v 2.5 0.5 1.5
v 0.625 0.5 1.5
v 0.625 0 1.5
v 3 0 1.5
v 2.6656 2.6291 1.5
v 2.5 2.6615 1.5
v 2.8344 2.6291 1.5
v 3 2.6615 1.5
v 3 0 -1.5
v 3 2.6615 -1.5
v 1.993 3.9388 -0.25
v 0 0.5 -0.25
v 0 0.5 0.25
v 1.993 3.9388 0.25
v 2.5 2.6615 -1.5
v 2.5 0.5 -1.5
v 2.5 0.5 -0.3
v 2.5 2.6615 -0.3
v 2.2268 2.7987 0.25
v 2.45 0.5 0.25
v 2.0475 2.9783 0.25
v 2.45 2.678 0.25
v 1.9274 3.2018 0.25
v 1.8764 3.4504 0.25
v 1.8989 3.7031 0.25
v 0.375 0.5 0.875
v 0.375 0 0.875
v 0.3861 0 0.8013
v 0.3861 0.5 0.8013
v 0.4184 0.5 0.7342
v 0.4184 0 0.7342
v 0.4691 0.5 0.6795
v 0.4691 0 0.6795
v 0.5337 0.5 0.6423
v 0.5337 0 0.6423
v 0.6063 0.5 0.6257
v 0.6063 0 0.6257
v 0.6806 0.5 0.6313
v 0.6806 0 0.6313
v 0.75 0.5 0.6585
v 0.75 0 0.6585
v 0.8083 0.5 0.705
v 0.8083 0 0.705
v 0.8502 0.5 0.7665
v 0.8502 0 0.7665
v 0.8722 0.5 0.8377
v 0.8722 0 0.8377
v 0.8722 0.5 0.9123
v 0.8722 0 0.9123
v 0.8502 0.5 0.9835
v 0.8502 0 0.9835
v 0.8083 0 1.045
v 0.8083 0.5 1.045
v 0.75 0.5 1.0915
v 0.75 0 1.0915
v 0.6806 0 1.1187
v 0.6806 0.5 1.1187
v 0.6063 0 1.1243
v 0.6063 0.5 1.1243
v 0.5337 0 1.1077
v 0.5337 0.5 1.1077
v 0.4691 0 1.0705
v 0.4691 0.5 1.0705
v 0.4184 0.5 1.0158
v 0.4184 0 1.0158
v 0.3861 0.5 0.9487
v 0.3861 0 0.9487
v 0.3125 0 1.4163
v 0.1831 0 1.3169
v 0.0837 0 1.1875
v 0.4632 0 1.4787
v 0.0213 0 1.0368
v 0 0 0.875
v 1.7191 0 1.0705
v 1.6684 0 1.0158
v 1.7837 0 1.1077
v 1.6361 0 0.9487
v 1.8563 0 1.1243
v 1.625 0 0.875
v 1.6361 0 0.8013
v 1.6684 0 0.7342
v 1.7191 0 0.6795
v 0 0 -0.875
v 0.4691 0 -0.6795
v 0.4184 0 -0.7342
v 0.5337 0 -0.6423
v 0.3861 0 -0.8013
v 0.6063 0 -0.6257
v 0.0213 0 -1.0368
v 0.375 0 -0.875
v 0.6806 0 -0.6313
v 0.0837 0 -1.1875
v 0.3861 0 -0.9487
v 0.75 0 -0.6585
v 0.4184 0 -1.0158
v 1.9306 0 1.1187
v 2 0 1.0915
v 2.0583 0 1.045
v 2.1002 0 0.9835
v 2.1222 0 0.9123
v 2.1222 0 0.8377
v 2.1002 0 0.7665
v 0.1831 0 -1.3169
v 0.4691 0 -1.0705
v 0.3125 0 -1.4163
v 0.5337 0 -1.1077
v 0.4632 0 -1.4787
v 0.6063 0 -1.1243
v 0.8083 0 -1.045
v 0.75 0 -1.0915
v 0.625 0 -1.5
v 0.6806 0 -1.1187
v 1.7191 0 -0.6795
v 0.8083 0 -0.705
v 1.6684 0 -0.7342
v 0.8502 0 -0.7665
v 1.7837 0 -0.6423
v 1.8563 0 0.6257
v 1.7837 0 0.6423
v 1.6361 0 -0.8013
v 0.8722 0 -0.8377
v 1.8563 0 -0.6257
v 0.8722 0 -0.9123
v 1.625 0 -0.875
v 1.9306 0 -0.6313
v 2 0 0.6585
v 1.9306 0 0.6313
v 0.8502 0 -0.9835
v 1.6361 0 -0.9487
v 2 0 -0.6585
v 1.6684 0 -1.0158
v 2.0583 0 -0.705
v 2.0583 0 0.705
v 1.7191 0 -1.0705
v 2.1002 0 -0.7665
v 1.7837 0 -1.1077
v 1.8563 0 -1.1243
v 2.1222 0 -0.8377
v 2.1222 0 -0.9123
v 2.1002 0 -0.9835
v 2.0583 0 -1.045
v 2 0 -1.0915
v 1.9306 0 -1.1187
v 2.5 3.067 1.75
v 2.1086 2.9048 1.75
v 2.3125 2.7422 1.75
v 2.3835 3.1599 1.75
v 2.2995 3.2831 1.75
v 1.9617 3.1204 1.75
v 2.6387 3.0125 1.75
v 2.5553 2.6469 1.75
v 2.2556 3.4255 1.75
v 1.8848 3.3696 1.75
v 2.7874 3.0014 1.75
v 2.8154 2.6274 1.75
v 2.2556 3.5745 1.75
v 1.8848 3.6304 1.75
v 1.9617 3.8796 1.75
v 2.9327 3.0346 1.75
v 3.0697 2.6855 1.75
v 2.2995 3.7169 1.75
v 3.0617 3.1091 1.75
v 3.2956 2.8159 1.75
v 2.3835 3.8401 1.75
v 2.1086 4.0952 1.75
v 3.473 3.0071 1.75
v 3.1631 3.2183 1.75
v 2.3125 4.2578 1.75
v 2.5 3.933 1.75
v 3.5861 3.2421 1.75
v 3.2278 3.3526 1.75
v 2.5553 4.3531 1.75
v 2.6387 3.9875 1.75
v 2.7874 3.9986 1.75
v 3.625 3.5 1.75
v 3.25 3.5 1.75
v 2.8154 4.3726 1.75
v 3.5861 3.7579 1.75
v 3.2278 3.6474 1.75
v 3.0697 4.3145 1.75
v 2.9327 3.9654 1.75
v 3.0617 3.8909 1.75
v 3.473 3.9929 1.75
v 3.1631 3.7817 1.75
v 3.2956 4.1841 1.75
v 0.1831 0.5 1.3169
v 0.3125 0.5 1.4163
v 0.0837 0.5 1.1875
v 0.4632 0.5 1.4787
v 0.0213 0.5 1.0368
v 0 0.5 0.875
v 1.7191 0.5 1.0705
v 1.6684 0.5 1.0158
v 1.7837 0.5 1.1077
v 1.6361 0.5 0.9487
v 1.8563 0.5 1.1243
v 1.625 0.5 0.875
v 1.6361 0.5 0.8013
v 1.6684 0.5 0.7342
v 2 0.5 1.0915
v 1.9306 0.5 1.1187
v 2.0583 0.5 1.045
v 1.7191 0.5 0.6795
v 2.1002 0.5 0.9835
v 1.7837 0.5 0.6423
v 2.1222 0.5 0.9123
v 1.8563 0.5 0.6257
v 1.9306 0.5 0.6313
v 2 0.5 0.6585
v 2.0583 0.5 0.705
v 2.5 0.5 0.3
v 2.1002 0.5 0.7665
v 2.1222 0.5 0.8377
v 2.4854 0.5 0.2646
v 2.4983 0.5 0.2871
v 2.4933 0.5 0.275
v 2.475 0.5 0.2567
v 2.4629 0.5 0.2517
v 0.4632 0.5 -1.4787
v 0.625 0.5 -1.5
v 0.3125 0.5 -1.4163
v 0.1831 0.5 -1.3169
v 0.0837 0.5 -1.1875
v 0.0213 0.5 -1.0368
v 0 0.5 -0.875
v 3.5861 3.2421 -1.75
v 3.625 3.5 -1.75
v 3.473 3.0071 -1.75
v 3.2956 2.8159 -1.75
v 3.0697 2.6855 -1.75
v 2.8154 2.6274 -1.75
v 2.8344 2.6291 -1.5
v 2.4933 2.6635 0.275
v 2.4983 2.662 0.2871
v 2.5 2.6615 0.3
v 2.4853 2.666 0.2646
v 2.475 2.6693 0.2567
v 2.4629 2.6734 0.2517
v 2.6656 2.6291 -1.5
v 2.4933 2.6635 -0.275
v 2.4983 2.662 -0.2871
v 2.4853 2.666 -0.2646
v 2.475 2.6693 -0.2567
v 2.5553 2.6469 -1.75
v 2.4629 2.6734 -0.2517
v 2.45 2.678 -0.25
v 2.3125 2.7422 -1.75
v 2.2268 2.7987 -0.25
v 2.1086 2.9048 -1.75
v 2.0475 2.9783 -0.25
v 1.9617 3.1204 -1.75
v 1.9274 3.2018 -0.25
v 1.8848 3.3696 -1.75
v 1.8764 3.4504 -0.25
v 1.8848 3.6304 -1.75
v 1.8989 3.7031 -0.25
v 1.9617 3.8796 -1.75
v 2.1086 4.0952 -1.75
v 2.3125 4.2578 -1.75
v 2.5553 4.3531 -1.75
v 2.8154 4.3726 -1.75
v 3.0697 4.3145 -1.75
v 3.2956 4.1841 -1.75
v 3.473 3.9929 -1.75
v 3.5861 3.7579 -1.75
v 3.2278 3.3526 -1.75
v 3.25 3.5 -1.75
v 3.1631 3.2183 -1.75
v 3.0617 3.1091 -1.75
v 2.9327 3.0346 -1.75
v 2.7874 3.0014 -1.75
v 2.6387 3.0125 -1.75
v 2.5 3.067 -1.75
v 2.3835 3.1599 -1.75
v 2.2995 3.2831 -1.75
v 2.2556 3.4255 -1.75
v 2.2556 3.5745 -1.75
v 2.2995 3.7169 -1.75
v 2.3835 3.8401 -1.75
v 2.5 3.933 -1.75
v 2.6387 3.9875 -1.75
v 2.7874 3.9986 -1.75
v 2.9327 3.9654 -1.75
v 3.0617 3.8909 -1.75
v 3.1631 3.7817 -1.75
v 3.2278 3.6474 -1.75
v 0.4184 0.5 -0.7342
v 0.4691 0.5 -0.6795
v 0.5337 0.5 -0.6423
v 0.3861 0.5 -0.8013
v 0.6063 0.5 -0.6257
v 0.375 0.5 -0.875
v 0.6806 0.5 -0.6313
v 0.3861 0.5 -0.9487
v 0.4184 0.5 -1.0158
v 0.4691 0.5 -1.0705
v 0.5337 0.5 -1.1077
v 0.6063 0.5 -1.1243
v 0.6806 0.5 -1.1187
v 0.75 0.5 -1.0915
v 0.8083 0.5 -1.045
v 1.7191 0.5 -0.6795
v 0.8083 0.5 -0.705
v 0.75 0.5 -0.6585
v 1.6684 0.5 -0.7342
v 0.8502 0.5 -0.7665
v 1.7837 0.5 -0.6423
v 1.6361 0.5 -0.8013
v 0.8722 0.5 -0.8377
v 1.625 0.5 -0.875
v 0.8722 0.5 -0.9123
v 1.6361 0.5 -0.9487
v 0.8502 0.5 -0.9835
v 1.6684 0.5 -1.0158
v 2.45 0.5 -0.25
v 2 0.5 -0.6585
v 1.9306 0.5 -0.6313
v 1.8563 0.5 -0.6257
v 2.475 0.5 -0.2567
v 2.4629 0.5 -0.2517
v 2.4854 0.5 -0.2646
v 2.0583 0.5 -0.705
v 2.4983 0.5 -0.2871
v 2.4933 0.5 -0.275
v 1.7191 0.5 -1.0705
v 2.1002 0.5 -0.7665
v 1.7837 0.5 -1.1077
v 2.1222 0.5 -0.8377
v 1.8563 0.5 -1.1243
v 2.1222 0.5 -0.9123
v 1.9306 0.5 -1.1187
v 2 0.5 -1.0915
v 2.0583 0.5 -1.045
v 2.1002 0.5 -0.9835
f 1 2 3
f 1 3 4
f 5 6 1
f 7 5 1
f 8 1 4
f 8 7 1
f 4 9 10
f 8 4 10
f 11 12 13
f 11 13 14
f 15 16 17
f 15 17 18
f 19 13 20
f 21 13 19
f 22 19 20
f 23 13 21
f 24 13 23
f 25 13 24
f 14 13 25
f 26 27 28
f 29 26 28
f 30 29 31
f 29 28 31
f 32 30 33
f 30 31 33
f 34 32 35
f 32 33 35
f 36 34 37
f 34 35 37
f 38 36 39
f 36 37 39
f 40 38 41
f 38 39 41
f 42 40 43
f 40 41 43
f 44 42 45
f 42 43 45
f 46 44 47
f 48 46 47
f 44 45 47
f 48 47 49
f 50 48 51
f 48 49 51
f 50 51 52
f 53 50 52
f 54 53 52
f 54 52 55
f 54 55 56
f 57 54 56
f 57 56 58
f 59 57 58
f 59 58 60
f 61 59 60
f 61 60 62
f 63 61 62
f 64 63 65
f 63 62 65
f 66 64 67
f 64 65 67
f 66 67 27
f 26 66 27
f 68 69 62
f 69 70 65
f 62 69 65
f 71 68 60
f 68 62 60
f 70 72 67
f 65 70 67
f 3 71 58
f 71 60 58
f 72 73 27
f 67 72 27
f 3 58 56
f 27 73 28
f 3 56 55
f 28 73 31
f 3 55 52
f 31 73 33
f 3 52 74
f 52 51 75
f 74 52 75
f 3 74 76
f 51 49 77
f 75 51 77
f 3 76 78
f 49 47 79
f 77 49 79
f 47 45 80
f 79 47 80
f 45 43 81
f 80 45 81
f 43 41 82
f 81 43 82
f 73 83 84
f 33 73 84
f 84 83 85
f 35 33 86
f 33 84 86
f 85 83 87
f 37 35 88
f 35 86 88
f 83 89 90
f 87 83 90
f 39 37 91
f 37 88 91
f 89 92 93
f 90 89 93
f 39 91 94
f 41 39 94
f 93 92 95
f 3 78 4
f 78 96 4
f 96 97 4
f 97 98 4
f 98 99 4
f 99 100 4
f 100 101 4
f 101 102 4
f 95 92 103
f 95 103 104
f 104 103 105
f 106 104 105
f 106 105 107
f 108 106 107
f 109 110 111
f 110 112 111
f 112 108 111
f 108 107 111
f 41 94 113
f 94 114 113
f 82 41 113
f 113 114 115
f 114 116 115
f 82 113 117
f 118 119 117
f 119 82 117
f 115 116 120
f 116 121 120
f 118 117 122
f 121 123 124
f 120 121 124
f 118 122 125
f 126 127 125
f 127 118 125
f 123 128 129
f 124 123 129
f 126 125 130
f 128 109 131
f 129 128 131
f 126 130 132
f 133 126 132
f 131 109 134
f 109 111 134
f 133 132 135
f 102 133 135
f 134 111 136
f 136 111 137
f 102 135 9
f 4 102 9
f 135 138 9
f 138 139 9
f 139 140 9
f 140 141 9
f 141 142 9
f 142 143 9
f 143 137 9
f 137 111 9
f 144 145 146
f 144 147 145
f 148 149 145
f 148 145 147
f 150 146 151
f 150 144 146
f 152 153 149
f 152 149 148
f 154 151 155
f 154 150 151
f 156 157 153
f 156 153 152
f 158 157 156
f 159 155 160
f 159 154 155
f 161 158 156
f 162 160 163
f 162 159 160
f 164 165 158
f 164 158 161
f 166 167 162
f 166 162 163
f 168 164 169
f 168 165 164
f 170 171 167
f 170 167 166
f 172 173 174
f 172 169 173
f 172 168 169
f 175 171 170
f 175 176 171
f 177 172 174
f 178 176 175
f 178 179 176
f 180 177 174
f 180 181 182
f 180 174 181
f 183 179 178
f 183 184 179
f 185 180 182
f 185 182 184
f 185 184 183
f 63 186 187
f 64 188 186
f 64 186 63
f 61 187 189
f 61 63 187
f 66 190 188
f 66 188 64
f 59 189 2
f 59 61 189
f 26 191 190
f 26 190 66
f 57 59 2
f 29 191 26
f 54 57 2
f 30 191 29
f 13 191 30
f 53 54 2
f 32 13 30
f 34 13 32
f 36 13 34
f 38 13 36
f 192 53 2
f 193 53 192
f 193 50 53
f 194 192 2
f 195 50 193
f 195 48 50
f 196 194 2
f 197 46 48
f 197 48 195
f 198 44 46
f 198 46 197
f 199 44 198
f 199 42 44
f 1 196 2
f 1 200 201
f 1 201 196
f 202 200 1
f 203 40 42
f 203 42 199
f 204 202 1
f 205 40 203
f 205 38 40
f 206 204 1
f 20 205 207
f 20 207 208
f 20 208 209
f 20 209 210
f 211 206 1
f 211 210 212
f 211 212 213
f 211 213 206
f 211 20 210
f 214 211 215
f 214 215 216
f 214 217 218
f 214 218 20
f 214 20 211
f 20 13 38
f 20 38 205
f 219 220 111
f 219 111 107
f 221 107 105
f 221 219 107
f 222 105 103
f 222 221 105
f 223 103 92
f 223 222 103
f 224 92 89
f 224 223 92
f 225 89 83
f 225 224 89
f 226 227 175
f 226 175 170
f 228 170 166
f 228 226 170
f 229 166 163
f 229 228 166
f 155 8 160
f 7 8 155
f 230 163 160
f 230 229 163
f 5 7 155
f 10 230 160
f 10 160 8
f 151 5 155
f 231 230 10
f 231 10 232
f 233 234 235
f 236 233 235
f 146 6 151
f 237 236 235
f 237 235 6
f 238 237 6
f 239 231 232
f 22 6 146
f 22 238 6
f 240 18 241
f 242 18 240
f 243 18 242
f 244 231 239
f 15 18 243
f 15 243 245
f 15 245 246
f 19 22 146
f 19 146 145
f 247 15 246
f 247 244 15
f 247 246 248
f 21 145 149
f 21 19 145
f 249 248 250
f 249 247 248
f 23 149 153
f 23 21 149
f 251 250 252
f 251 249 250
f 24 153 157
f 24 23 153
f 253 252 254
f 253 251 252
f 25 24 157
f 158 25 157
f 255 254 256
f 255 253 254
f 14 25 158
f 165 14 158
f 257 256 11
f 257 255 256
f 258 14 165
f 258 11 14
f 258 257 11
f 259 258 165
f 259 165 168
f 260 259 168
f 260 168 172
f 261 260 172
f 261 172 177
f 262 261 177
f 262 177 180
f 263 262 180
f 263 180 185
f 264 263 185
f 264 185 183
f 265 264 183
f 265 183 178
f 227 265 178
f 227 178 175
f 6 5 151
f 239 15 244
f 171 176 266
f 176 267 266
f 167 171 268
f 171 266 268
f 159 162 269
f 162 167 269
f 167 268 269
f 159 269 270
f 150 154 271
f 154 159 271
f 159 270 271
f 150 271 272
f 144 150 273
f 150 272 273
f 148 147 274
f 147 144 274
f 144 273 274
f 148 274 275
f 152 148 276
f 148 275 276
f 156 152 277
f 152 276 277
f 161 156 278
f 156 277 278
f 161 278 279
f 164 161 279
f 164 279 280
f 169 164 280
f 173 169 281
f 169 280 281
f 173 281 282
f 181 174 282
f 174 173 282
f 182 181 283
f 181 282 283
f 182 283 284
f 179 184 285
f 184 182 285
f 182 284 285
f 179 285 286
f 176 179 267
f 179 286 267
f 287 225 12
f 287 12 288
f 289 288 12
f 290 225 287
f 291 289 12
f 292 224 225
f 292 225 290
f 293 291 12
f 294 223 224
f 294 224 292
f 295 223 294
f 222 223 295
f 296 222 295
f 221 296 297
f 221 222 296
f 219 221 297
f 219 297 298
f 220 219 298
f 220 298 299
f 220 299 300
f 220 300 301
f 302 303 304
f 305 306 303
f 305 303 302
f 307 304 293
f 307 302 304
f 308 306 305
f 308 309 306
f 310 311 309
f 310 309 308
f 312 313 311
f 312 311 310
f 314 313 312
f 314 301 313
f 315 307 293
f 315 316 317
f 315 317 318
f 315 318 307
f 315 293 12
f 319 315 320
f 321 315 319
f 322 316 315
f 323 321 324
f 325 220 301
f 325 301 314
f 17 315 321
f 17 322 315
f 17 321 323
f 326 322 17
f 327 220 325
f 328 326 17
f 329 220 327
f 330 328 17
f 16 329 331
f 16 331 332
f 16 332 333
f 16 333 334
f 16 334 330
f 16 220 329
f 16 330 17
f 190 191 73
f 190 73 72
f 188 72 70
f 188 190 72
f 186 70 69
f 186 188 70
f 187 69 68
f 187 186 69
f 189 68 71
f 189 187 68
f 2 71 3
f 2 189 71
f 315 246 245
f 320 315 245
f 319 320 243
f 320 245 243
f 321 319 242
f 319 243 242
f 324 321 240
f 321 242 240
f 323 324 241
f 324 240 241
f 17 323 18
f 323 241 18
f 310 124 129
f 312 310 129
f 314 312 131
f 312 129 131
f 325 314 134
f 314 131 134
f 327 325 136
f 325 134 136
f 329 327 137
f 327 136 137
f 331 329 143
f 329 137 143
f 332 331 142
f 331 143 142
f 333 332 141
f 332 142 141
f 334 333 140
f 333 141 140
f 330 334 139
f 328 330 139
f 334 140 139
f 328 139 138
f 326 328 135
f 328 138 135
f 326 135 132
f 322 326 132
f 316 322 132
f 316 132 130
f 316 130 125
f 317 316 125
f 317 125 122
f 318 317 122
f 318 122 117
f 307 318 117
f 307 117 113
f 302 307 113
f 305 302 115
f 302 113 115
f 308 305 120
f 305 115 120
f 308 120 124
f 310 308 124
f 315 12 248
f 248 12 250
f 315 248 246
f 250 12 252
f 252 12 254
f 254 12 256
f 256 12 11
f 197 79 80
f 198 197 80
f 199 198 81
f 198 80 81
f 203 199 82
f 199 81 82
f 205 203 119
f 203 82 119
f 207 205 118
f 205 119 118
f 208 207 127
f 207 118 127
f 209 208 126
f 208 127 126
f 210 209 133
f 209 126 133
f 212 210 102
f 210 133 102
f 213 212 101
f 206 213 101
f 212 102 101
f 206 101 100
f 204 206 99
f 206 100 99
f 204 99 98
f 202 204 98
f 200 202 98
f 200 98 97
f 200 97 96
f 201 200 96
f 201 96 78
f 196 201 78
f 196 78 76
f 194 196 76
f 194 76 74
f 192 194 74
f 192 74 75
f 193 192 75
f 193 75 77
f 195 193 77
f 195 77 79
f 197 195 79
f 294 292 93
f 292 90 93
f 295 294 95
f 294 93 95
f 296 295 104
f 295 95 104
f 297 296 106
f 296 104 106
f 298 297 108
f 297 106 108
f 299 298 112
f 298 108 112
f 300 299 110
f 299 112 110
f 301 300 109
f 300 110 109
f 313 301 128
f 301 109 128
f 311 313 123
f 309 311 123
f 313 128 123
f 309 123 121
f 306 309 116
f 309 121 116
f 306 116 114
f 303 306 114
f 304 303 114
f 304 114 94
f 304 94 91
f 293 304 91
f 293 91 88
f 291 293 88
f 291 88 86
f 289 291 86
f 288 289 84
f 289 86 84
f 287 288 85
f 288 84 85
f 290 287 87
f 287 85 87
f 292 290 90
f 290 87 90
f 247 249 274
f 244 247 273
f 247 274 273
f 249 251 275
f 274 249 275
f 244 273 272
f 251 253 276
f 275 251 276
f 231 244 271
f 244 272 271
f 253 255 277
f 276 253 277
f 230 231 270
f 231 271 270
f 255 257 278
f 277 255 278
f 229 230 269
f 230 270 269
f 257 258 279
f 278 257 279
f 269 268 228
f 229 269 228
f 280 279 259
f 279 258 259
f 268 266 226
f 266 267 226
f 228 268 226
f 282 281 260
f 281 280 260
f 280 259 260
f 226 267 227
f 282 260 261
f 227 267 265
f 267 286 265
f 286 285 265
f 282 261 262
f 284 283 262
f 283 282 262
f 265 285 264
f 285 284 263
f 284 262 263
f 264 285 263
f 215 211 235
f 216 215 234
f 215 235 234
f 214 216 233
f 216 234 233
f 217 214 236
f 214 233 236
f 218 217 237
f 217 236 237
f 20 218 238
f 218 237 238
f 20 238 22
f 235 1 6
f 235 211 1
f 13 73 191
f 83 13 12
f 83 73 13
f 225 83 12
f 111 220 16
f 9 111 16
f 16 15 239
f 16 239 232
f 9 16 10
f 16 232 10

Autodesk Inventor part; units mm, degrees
ref_plane "YZ Plane" through (0, 0, 0) normal (1, 0, 0) x (0, 1, 0)
ref_plane "XZ Plane" through (0, 0, 0) normal (0, 1, 0) x (-1, 0, 0)
ref_plane "XY Plane" through (0, 0, 0) normal (0, 0, 1) x (1, 0, 0)
sketch "Sketch1" plane through (0, 0, 0) normal (0, 0, 1) x (1, 0, 0)
  line L0 (0, 0) -> (0, 0.5)
  line L1 (0, 0.5) -> (2.5, 0.5)
  line L2 (2.5, 0.5) -> (2.5, 2.6615)
  line L3 (0, 0) -> (3, 0)
  line L4 (3, 0) -> (3, 2.6615)
  circle A0 centre (2.75, 3.5) radius 0.5
  circle A1 centre (2.75, 3.5) radius 0.875
  line L5 (0, 0.5) -> (1.993, 3.9388)
  dimension "d0" = 0.5
  dimension "d1" = 0.5
  dimension "d2" = 3
  dimension "d3" = 1
  dimension "d4" = 1.75
  dimension "d20" = 3
sketch "Sketch2" plane through (0, 0, 0) normal (0, 1, 0) x (-1, 0, 0)
  line L0 (0.7553, 0) -> (-3.6259, 0) projected
  line L1 (0, 0) -> (0, -0.875)
  arc A0 (-0.625, -1.5) -> (0, -0.875) centre (-0.625, -0.875) ccw
  line L2 (-0.625, -1.5) -> (-3, -1.5)
  line L3 (-3, -1.5) -> (-3, 1.5)
  line L4 (-3, 1.5) -> (-0.625, 1.5)
  arc A1 (0, 0.875) -> (-0.625, 1.5) centre (-0.625, 0.875) ccw
  line L5 (0, 0.875) -> (0, 0)
  line L6 (0, -0.25) -> (-2.5, -0.25)
  line L7 (-2.5, -0.25) -> (-2.5, -1.5)
  line L8 (0, 0.25) -> (-2.5, 0.25)
  line L9 (-2.5, 0.25) -> (-2.5, 1.5)
  circle A2 centre (-0.625, -0.875) radius 0.25
  circle A3 centre (-1.875, -0.875) radius 0.25
  circle A4 centre (-0.625, 0.875) radius 0.25
  circle A5 centre (-1.875, 0.875) radius 0.25
  point P0 (-0.625, -0.875)
  point P1 (-1.875, -0.875)
  point P2 (-1.875, 0.875)
  point P3 (-0.625, 0.875)
  dimension "d5" = 1.75
  dimension "d6" = 1.25
  dimension "d7" = 0.625
  dimension "d8" = 1.25
  dimension "d9" = 2.5
  dimension "d10" = 3
  dimension "d11" = 0.5
  dimension "d14" = 1.25
  dimension "d17" = 1.75
  dimension "d21" = 3
extrude "Extrusion1" add sketch "Sketch1" along normal mid plane 3 contours L0 L1 L2 A1 L4 L3
extrude "Extrusion2" add sketch "Sketch1" along normal mid plane 3.5 contours A1
extrude "Extrusion3" add sketch "Sketch1" along normal mid plane 0.5 contours L5 A1 L2 L1
fillet "Fillet1" radius 0.625 2 edges at (0, 0.25, 1.5) (0, 0.25, -1.5)
extrude "Extrusion4" cut sketch "Sketch2" along normal blind 0.6 contours A2 | A3 | A4 | A5
fillet "Fillet2" radius 0.05 2 edges at (2.5, 1.5807, -0.25) (2.5, 1.5807, 0.25)
properties part number "7d"
